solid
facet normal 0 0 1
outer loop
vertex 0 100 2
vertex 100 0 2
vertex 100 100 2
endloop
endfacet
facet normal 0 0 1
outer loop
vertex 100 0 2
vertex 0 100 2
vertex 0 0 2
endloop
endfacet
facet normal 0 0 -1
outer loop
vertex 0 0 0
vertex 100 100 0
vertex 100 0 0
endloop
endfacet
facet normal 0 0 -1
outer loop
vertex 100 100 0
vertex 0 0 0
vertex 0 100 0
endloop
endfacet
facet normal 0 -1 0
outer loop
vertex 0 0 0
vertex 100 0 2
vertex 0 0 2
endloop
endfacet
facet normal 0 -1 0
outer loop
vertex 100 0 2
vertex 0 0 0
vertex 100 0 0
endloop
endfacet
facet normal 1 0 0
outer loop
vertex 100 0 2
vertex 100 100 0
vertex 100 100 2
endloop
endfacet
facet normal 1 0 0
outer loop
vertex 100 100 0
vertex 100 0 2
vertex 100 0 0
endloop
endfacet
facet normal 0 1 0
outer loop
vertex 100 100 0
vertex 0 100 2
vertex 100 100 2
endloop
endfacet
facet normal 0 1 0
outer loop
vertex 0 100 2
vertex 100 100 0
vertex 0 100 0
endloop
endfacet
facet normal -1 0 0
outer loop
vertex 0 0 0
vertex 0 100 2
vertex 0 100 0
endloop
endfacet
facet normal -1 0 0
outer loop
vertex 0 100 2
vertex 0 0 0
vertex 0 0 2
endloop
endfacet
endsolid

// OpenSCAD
path = "../../../public/3dev.png";

// surface(file = path, invert = true);

union(){

    cube([100,100,2]);

    translate([0,0,2])

        surface(file = path);

}
